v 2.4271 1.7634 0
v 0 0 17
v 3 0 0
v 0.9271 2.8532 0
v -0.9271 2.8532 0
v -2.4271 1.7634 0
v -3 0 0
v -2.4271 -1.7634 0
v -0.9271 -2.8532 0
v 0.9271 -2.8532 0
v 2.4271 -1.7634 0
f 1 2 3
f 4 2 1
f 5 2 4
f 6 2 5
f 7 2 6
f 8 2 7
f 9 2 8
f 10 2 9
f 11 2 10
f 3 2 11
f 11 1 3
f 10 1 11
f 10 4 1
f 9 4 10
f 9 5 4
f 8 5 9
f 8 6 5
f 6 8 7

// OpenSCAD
// Generated by SolidPython 1.0.1 on 2020-07-29 00:46:43


cylinder(h = 17, r1 = 3, r2 = 0);
/***********************************************
*********      SolidPython code:      **********
************************************************
 
# import packages: SolidPython
from solid import *
from solid.utils import *
from itertools import chain, combinations, permutations


class Resize:

    def __init__(self, scad_file):
        self.scad_file = scad_file
        #self.scad_file = import_scad(scad_file)
        # cone/cylinder param:
        self.r1 = 0
        self.r2 = 0
        self.h = 0
        # rectangular prism param:
        self.w = 0
        self.l = 0
        # ellipse param:
        self.r = 0

    # import OpenScad code (file name corresponds to shape)


    # classify shape + parameters
    def assign(self, param1, param2, param3):
        if self.scad_file == 'cone.scad':
            self.r1 = param1
            self.r2 = param2
            self.h = param3
        elif self.scad_file == 'cylinder.scad':
            self.r1 = param1
            self.r2 = param2
            self.h = param3
        elif self.scad_file == 'rectangularPrism.scad':
            self.h = param1
            self.l = param2
            self.w = param3
        else:
            self.r = param1
            self.h = param2

    # resize parameters
    def iterate(self):
        x = range(3, 20, 2)
        i = 1
        if self.scad_file == 'cone.scad':
            tempList = list(permutations(x, 2))
            for temp in tempList:
                param1 = temp[0]
                param2 = temp[1]
                filepath = 'produced_scad_files/' + 'cone' + str(param1) + '_' + str(param2) + '_' + '.scad'
                scad_render_to_file(cylinder(h=param1, r1=param2, r2=0), filepath)

        elif self.scad_file == 'cylinder.scad':
            tempList = list(permutations(x, 3))
            for temp in tempList:
                param1 = temp[0]
                param2 = temp[1]
                filepath = 'produced_scad_files/' + 'cylinder' + str(param1) + '_' + str(param2) + '_' + '.scad'
                scad_render_to_file(cylinder(h=param1, r1=param2, r2=param2), filepath)

        elif self.scad_file == 'rectangularPrism.scad':
            tempList = list(permutations(x, 3))
            for temp in tempList:
                param1 = temp[0]
                param2 = temp[1]
                param3 = temp[2]
                filepath = 'produced_scad_files/' + 'rectangularPrism' + str(param1) + '_' + str(param2) + '_' + str(
                    param3) + '.scad'
                scad_render_to_file(cube(size=(param1, param2, param3)), filepath)

        elif self.scad_file == 'ellipse.scad':
            tempList = list(permutations(x, 4))
            for temp in tempList:
                param1 = temp[0]
                param2 = temp[1]
                param3 = temp[2]
                param4 = temp[3]
                filepath = 'produced_scad_files/' + 'ellipse' + str(param1) + '_' + str(param2) + '_' + str(param3) + '_' + str(param4) + '.scad'
                scad_render_to_file(scale([param1, param2, param3])(sphere(r=param4)), filepath)

    def render_to_scadfile(self):
        scad_render_to_file(scad, 'example.scad') 
 
************************************************/
